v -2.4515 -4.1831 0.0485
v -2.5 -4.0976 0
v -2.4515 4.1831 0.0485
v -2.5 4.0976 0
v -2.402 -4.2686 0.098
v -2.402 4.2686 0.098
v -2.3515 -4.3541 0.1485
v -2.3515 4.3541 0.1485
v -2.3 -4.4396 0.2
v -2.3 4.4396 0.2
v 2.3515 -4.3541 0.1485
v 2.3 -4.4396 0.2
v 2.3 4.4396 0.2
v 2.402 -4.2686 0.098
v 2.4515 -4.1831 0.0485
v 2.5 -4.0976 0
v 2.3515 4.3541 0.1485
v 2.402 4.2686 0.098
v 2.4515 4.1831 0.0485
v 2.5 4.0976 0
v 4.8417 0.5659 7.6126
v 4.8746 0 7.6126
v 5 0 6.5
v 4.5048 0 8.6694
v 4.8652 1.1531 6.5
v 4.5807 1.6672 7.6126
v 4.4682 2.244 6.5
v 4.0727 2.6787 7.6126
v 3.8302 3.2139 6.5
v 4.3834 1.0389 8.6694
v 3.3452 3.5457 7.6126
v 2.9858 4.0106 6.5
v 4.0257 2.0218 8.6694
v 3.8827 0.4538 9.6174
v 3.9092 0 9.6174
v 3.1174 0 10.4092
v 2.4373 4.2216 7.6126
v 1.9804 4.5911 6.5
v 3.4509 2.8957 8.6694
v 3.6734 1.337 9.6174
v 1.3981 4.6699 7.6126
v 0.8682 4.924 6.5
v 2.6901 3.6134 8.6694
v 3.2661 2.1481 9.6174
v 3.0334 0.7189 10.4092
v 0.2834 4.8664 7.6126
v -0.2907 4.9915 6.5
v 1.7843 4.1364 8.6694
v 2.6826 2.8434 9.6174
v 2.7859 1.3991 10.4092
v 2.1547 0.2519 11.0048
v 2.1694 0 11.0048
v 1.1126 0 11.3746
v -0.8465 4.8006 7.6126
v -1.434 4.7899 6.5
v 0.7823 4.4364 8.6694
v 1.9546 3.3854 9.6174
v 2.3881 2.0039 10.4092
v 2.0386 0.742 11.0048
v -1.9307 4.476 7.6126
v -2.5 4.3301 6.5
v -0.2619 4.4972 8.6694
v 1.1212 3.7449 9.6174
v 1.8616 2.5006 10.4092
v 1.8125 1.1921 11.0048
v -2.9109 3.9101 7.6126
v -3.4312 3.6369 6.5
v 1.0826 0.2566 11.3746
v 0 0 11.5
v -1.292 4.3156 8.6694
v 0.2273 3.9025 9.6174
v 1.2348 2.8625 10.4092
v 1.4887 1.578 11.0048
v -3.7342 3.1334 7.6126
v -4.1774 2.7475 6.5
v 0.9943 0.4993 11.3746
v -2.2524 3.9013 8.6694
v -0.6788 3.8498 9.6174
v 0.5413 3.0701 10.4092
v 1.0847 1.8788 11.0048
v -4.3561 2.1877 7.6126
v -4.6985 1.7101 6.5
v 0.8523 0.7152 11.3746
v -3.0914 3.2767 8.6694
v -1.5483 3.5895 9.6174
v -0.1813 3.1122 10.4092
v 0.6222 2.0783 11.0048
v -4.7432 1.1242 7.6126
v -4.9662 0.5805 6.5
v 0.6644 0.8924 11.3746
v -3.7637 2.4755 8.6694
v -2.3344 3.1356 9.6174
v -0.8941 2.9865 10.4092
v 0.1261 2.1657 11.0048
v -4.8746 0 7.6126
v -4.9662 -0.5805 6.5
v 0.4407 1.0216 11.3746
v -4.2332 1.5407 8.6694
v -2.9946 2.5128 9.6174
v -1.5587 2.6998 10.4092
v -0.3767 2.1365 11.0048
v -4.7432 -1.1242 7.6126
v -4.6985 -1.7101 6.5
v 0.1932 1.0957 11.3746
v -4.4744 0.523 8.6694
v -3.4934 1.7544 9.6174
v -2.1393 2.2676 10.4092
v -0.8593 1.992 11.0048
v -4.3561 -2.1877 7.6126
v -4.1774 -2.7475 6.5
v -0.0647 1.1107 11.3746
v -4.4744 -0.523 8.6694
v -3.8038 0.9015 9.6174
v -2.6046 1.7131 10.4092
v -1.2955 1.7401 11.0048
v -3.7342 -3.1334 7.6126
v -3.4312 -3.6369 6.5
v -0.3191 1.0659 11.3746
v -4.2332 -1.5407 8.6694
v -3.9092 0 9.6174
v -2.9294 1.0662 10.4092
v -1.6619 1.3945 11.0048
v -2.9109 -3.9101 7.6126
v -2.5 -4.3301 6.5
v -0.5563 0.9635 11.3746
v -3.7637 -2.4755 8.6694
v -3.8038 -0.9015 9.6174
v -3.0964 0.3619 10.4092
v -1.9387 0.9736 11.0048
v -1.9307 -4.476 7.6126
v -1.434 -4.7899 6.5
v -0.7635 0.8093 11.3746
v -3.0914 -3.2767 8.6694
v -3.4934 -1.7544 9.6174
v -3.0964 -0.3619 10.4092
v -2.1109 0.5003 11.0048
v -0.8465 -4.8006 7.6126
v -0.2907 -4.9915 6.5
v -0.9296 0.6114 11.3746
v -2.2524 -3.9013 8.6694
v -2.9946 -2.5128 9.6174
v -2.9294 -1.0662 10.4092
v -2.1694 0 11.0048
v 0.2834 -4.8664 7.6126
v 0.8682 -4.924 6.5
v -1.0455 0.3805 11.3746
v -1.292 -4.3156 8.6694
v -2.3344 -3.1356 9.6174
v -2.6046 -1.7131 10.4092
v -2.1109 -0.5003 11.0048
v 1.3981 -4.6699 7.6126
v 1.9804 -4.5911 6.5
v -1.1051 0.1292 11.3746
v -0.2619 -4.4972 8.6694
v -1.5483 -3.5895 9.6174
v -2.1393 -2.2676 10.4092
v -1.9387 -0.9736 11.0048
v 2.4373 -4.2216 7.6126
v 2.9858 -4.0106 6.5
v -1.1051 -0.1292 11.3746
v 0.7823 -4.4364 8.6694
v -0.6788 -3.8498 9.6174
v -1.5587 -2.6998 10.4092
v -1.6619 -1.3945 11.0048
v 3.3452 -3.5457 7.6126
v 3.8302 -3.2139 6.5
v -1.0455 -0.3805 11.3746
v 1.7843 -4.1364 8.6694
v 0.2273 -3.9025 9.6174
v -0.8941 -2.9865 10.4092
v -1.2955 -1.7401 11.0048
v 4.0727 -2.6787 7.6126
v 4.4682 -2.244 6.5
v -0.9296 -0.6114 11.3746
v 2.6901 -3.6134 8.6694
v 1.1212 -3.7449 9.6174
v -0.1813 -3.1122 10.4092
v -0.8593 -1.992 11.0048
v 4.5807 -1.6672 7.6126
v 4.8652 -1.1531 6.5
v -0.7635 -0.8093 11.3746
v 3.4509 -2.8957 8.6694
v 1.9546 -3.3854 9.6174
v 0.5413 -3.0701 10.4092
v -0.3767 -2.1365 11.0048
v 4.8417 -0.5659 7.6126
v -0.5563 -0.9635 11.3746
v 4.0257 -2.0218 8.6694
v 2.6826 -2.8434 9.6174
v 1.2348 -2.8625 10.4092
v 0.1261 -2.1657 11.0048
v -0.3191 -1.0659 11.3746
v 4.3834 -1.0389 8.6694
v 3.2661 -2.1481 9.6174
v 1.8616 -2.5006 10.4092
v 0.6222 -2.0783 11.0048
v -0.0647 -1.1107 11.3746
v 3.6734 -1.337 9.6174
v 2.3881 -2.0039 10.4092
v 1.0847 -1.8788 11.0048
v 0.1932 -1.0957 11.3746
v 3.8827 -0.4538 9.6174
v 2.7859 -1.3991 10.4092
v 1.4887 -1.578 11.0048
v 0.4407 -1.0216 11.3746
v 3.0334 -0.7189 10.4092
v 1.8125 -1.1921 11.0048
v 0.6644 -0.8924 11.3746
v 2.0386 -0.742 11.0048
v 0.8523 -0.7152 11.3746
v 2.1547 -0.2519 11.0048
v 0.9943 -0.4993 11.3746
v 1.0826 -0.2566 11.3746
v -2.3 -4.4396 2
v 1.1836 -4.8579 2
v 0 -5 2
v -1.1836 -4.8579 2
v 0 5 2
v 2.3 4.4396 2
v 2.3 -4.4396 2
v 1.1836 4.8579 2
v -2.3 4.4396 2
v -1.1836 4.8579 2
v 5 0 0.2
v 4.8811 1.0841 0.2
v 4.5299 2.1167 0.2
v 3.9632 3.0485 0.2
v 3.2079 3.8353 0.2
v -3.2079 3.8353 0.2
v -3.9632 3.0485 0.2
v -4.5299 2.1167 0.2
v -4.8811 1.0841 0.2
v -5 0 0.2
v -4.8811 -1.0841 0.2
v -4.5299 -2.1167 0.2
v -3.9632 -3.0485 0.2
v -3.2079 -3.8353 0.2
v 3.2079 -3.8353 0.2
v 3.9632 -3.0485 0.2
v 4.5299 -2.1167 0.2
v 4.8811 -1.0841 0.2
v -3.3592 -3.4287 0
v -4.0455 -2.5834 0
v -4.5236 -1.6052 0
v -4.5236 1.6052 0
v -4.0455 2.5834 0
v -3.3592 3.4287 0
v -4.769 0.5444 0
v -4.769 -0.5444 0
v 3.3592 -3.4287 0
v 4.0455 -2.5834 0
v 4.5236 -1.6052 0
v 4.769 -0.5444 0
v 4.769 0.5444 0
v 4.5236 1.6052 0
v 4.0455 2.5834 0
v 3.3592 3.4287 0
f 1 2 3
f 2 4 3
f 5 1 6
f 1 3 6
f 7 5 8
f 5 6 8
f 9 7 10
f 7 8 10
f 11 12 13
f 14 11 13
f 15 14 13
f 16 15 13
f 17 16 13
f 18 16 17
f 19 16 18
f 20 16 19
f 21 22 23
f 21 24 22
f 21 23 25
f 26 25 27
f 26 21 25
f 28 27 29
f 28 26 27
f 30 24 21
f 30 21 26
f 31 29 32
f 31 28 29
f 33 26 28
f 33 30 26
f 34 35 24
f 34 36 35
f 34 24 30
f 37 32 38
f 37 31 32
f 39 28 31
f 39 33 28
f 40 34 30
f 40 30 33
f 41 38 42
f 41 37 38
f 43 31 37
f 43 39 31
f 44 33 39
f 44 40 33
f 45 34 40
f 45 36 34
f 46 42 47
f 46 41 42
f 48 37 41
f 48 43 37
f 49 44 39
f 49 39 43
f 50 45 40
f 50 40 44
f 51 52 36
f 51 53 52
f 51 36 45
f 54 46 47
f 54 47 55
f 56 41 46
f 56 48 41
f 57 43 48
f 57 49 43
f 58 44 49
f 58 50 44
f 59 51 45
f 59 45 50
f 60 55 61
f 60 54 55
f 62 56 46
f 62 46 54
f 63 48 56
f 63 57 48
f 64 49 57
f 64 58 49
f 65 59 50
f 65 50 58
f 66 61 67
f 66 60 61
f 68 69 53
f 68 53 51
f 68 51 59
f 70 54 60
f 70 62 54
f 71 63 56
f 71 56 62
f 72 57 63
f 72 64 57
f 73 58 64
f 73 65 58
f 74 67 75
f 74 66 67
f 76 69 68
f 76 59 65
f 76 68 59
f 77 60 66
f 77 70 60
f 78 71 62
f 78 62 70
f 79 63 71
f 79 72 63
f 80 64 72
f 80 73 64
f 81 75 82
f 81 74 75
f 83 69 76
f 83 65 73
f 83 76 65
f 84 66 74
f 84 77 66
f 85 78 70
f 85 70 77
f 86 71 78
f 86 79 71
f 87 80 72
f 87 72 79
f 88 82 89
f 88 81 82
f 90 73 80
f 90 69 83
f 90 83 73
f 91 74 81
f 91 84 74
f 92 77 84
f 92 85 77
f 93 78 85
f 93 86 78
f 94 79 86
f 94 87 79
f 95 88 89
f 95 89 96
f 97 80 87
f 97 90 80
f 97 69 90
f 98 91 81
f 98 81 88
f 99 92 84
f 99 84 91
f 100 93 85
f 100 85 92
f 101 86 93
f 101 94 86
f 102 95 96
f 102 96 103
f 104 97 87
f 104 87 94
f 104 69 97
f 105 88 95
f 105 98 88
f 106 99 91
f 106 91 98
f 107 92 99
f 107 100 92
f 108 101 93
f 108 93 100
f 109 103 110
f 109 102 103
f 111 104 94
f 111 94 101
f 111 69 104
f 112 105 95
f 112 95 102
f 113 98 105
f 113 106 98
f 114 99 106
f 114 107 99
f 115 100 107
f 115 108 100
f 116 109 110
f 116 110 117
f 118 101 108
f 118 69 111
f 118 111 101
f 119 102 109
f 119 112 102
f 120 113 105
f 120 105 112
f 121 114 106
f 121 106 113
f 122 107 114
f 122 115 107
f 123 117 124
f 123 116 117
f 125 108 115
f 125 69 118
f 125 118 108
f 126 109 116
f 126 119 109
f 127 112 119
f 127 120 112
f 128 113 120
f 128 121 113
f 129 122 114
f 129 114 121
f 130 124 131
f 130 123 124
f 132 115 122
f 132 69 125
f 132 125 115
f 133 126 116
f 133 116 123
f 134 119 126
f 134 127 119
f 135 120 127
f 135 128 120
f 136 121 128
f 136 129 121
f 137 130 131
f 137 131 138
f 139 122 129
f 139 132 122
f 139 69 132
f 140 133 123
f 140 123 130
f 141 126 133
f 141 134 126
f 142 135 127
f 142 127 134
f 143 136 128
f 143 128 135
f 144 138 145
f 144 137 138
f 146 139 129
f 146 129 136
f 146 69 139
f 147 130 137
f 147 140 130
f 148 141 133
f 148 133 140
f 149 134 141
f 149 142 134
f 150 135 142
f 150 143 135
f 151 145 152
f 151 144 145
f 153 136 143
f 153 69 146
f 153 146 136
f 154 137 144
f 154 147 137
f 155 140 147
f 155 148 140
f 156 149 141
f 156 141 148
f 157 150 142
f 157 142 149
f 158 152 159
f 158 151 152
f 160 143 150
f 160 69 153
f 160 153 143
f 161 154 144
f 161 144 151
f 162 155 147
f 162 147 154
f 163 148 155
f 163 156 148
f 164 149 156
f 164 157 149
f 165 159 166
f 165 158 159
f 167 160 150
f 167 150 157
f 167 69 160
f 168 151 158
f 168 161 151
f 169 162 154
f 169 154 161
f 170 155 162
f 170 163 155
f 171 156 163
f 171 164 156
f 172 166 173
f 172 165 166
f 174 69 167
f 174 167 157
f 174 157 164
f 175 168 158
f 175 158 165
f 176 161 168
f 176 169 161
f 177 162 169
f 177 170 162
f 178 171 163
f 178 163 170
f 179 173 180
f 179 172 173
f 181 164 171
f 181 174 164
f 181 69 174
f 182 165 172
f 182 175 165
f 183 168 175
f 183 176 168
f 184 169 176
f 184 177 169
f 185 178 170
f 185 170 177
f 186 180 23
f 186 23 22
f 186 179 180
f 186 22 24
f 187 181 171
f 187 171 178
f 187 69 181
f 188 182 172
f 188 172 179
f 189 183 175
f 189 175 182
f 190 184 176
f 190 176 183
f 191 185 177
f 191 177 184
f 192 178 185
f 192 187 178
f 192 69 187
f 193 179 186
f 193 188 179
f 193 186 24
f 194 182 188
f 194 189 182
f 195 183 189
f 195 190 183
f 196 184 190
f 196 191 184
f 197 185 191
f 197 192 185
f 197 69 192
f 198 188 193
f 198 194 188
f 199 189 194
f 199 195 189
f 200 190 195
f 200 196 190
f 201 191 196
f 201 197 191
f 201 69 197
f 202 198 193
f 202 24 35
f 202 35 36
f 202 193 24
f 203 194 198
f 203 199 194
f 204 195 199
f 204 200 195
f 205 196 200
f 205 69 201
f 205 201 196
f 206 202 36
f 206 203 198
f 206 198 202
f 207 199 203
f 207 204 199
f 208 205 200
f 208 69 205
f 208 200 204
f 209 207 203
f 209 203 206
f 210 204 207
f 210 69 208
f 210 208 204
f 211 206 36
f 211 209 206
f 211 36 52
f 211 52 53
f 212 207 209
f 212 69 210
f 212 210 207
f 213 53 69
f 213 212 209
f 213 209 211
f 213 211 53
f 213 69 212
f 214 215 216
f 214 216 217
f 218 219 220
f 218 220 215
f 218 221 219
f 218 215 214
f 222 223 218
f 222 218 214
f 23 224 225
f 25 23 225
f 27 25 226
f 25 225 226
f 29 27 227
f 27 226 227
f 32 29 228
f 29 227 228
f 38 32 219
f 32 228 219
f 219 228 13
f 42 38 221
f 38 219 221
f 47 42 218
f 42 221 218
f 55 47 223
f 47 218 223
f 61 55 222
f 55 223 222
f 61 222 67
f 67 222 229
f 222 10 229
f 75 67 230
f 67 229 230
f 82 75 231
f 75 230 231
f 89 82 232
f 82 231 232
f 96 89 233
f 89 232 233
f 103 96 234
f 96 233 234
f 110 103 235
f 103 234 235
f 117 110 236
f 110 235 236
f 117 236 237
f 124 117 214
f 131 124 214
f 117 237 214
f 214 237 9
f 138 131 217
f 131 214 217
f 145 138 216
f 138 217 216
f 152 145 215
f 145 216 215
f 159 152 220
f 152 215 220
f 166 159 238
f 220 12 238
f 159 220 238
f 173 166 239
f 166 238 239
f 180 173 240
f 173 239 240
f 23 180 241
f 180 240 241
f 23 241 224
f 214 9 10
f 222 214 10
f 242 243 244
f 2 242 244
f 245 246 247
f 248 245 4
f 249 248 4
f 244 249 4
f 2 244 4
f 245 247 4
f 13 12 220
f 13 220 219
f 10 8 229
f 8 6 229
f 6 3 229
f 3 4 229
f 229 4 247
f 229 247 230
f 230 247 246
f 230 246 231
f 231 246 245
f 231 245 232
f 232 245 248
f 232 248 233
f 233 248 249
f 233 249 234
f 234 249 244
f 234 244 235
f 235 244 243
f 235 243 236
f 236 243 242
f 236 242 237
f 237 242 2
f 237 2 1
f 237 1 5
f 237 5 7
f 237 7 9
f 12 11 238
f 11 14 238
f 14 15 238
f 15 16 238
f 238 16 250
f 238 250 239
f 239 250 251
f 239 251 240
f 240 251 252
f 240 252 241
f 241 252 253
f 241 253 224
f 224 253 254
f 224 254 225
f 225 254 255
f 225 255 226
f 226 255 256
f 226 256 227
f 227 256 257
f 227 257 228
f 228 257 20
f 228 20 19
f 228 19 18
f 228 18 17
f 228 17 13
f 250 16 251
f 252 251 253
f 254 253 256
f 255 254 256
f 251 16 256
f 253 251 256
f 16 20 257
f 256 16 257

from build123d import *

# Parameters (mm, degrees)
SKETCH1_R           = 5
BOSS_EXTRUDE1_DEPTH = 11.5
FILLET1_R           = 5
SKETCH4_W           = 4.6
SKETCH4_H           = 15
CUT_EXTRUDE1_DEPTH  = 2
CHAMFER1_SIZE       = 0.2


with BuildPart() as part:
    # Sketch1 → Boss-Extrude1 (new body)
    with BuildSketch(Plane.XY):
        Circle(SKETCH1_R)
    extrude(amount=BOSS_EXTRUDE1_DEPTH)

    # Fillet1
    fillet1_edges = [part.edges().sort_by_distance(p)[0] for p in [
        (-5, 0, 11.5),
    ]]
    fillet(fillet1_edges, radius=FILLET1_R)

    # Sketch4 → Cut-Extrude1 (cut)
    with BuildSketch(Plane(origin=(0, 0, 0), x_dir=(-1, 0, 0), z_dir=(0, 0, -1))):
        Rectangle(SKETCH4_W, SKETCH4_H)
    extrude(amount=-CUT_EXTRUDE1_DEPTH, mode=Mode.SUBTRACT)

    # Chamfer1
    chamfer1_edges = [part.edges().sort_by_distance(p)[0] for p in [
        (-5, 0, 0),
        (4.272001873, 2.598076211, 0),
        (-2.3, 0, 0),
        (2.3, 0, 0),
    ]]
    chamfer(chamfer1_edges, length=CHAMFER1_SIZE)


solid = part.part
